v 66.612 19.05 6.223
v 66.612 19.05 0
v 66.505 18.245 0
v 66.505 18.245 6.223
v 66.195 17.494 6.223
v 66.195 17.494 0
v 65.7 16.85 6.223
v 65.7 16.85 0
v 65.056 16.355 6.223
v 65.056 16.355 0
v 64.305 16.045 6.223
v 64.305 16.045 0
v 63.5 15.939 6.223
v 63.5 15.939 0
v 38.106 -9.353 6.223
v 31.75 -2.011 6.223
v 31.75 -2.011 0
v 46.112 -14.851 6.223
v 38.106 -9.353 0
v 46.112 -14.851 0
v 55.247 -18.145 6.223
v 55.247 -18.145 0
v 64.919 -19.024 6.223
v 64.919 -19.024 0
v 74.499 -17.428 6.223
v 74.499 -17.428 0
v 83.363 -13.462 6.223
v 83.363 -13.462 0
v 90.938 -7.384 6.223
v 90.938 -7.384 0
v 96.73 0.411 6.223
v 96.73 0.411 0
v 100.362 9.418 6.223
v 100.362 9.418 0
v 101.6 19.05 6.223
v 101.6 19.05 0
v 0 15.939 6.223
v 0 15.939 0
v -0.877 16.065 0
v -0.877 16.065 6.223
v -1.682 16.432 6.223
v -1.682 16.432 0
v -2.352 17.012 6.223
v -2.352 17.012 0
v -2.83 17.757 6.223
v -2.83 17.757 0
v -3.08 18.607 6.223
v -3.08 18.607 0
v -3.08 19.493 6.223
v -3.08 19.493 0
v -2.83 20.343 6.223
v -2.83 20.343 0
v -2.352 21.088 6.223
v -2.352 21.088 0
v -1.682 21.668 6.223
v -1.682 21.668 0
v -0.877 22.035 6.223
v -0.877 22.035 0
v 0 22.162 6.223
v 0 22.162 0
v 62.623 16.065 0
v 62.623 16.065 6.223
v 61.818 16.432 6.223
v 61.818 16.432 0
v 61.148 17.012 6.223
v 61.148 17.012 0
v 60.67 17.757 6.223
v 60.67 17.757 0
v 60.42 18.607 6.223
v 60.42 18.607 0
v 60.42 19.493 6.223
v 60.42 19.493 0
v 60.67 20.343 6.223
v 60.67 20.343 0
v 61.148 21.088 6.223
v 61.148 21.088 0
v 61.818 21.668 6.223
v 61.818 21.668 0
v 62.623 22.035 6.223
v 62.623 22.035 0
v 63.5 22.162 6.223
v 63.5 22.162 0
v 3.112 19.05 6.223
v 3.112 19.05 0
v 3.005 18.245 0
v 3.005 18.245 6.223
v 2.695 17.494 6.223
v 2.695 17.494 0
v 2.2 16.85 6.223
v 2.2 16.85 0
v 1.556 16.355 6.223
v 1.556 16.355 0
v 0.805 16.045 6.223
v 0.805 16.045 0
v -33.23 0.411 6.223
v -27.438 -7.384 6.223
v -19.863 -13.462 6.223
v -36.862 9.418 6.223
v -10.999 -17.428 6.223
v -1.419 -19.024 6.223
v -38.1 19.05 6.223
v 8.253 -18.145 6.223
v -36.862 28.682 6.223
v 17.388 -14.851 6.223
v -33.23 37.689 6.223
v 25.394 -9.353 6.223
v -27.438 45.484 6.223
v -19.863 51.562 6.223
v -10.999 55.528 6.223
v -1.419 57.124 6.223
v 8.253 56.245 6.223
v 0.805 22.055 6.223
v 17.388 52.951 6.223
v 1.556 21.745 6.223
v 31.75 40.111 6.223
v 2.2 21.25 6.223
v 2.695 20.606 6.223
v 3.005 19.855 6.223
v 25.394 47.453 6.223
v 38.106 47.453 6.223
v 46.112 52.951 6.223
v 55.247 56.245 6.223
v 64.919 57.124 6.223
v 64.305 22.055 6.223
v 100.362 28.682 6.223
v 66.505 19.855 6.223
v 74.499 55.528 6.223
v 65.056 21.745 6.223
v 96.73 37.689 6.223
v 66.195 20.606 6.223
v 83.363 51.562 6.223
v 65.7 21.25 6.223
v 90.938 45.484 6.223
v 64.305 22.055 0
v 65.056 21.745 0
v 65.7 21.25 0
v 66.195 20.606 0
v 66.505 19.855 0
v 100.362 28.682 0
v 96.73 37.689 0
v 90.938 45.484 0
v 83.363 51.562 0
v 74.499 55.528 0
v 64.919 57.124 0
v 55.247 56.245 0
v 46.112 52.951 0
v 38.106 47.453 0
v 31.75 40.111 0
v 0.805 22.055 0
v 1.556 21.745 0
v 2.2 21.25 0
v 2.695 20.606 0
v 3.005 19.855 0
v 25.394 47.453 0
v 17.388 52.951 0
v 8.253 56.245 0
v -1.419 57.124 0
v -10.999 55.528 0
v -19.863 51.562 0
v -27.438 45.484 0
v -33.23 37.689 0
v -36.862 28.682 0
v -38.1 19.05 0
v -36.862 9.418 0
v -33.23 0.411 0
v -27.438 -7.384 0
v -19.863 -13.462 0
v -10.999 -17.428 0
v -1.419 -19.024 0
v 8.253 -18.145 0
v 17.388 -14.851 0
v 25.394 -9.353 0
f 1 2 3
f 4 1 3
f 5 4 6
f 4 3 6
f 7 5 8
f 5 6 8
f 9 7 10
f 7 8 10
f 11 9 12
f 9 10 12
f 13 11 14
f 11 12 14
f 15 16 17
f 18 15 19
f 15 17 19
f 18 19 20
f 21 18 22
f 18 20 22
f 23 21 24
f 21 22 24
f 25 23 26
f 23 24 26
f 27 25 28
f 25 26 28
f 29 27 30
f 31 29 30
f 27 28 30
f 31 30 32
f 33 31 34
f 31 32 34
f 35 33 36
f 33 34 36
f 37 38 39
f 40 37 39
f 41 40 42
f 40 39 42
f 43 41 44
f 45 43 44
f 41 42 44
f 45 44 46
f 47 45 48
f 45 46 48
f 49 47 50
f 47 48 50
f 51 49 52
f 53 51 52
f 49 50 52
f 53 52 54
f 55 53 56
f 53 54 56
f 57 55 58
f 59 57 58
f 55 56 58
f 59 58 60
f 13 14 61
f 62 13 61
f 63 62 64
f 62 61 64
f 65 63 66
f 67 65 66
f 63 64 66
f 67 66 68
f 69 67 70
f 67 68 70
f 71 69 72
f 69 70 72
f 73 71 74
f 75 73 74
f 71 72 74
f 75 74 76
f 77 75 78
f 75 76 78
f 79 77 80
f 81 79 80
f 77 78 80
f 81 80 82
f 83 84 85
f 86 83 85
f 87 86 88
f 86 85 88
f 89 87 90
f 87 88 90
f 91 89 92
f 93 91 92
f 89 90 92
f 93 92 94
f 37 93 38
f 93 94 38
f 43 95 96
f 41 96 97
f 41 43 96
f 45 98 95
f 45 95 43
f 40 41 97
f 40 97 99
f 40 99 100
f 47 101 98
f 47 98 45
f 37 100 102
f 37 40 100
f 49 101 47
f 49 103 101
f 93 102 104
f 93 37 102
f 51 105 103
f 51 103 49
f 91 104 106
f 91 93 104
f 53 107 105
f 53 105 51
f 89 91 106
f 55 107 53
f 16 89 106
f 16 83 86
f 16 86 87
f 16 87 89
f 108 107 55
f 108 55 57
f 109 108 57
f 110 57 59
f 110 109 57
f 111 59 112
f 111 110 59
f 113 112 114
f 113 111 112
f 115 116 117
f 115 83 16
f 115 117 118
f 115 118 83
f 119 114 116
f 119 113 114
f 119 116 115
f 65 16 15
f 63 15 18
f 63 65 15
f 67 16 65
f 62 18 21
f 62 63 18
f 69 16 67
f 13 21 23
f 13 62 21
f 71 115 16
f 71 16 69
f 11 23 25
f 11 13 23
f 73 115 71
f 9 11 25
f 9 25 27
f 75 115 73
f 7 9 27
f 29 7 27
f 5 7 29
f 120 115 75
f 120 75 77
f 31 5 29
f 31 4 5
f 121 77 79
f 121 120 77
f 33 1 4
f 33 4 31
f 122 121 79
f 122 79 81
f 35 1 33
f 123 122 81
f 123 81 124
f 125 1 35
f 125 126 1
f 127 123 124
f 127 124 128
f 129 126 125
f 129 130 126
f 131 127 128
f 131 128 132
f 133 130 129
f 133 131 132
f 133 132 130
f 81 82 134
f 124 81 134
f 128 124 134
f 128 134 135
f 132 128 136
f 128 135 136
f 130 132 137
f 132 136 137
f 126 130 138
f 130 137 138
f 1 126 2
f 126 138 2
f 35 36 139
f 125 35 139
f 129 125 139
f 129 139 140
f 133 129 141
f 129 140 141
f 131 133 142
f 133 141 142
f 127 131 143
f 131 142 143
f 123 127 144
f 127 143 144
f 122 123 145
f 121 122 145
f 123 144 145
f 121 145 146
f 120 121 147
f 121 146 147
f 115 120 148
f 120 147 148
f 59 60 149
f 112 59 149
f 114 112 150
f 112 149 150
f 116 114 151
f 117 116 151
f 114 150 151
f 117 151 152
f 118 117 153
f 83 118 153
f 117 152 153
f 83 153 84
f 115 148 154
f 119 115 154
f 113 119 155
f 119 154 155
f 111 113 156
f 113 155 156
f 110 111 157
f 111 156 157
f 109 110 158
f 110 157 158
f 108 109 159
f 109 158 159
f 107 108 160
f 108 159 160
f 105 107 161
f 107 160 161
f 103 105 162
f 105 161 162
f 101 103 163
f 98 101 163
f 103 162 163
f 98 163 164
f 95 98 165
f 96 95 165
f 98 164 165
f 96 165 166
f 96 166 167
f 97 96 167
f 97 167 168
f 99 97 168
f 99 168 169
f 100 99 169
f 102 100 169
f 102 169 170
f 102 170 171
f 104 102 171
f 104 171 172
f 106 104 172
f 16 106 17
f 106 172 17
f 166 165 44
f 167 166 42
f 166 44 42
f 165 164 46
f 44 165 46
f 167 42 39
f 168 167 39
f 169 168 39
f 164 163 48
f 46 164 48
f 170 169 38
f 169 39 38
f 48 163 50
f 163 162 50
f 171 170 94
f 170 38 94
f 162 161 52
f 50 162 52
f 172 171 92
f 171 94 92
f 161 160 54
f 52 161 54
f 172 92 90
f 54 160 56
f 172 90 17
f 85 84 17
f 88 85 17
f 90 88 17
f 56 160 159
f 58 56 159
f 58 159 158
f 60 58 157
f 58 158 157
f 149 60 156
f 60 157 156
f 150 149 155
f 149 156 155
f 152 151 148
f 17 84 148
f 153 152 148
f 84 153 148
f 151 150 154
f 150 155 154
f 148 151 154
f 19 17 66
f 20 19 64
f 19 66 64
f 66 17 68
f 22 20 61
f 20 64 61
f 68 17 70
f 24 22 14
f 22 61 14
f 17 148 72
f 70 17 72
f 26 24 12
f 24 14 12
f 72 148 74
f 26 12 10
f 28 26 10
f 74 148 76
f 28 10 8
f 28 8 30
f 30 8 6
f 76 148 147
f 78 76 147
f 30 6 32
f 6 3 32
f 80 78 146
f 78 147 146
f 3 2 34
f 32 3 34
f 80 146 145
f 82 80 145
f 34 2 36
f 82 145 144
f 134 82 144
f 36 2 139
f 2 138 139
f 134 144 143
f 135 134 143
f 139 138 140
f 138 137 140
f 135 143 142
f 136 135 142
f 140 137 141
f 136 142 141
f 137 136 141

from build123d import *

# Parameters (mm, degrees)
BOSS_EXTRUDE1_DEPTH = 6.223


with BuildPart() as part:
    # Sketch1 → Boss-Extrude1 (new body)
    with BuildSketch(Plane.XY):
        with BuildLine():
            Line((0, 15.9385), (0, 0))
            Line((0, 0), (30.504432116, 0))
            ThreePointArc((30.504432116, 0), (25.4, 19.05), (30.504432116, 38.1))
            Line((30.504432116, 38.1), (0, 38.1))
            Line((0, 38.1), (0, 22.1615))
            ThreePointArc((0, 22.1615), (2.20016275, 21.25016275), (3.1115, 19.05))
            ThreePointArc((3.1115, 19.05), (2.20016275, 16.84983725), (0, 15.9385))
        make_face()
        with BuildLine():
            Line((30.504432116, 0), (0, 0))
            Line((0, 0), (0, 15.9385))
            ThreePointArc((0, 15.9385), (-3.1115, 19.05), (0, 22.1615))
            Line((0, 22.1615), (0, 38.1))
            Line((0, 38.1), (30.504432116, 38.1))
            ThreePointArc((30.504432116, 38.1), (31.111611101, 39.114951146), (31.75, 40.110567419))
            ThreePointArc((31.75, 40.110567419), (-38.1, 19.05), (31.75, -2.010567419))
            ThreePointArc((31.75, -2.010567419), (31.111611101, -1.014951146), (30.504432116, 0))
        make_face()
        with BuildLine():
            ThreePointArc((31.75, 40.110567419), (31.111611101, 39.114951146), (30.504432116, 38.1))
            Line((30.504432116, 38.1), (32.995567884, 38.1))
            ThreePointArc((32.995567884, 38.1), (32.388388899, 39.114951146), (31.75, 40.110567419))
        make_face()
        with BuildLine():
            Line((63.5, 0), (32.995567884, 0))
            ThreePointArc((32.995567884, 0), (32.388388899, -1.014951146), (31.75, -2.010567419))
            ThreePointArc((31.75, -2.010567419), (74.498522628, -17.427972806), (101.6, 19.05))
            ThreePointArc((101.6, 19.05), (74.498522628, 55.527972806), (31.75, 40.110567419))
            ThreePointArc((31.75, 40.110567419), (32.388388899, 39.114951146), (32.995567884, 38.1))
            Line((32.995567884, 38.1), (63.5, 38.1))
            Line((63.5, 38.1), (63.5, 22.1615))
            ThreePointArc((63.5, 22.1615), (65.70016275, 21.25016275), (66.6115, 19.05))
            ThreePointArc((66.6115, 19.05), (65.70016275, 16.84983725), (63.5, 15.9385))
            Line((63.5, 15.9385), (63.5, 0))
        make_face()
        with BuildLine():
            ThreePointArc((30.504432116, 38.1), (25.4, 19.05), (30.504432116, 0))
            Line((30.504432116, 0), (32.995567884, 0))
            ThreePointArc((32.995567884, 0), (36.801773982, 9.188994382), (38.1, 19.05))
            ThreePointArc((38.1, 19.05), (36.801773982, 28.911005618), (32.995567884, 38.1))
            Line((32.995567884, 38.1), (30.504432116, 38.1))
        make_face()
        with BuildLine():
            ThreePointArc((38.1, 19.05), (36.801773982, 9.188994382), (32.995567884, 0))
            Line((32.995567884, 0), (63.5, 0))
            Line((63.5, 0), (63.5, 15.9385))
            ThreePointArc((63.5, 15.9385), (60.3885, 19.05), (63.5, 22.1615))
            Line((63.5, 22.1615), (63.5, 38.1))
            Line((63.5, 38.1), (32.995567884, 38.1))
            ThreePointArc((32.995567884, 38.1), (36.801773982, 28.911005618), (38.1, 19.05))
        make_face()
        with BuildLine():
            Line((32.995567884, 0), (30.504432116, 0))
            ThreePointArc((30.504432116, 0), (31.111611101, -1.014951146), (31.75, -2.010567419))
            ThreePointArc((31.75, -2.010567419), (32.388388899, -1.014951146), (32.995567884, 0))
        make_face()
    extrude(amount=BOSS_EXTRUDE1_DEPTH)


solid = part.part
